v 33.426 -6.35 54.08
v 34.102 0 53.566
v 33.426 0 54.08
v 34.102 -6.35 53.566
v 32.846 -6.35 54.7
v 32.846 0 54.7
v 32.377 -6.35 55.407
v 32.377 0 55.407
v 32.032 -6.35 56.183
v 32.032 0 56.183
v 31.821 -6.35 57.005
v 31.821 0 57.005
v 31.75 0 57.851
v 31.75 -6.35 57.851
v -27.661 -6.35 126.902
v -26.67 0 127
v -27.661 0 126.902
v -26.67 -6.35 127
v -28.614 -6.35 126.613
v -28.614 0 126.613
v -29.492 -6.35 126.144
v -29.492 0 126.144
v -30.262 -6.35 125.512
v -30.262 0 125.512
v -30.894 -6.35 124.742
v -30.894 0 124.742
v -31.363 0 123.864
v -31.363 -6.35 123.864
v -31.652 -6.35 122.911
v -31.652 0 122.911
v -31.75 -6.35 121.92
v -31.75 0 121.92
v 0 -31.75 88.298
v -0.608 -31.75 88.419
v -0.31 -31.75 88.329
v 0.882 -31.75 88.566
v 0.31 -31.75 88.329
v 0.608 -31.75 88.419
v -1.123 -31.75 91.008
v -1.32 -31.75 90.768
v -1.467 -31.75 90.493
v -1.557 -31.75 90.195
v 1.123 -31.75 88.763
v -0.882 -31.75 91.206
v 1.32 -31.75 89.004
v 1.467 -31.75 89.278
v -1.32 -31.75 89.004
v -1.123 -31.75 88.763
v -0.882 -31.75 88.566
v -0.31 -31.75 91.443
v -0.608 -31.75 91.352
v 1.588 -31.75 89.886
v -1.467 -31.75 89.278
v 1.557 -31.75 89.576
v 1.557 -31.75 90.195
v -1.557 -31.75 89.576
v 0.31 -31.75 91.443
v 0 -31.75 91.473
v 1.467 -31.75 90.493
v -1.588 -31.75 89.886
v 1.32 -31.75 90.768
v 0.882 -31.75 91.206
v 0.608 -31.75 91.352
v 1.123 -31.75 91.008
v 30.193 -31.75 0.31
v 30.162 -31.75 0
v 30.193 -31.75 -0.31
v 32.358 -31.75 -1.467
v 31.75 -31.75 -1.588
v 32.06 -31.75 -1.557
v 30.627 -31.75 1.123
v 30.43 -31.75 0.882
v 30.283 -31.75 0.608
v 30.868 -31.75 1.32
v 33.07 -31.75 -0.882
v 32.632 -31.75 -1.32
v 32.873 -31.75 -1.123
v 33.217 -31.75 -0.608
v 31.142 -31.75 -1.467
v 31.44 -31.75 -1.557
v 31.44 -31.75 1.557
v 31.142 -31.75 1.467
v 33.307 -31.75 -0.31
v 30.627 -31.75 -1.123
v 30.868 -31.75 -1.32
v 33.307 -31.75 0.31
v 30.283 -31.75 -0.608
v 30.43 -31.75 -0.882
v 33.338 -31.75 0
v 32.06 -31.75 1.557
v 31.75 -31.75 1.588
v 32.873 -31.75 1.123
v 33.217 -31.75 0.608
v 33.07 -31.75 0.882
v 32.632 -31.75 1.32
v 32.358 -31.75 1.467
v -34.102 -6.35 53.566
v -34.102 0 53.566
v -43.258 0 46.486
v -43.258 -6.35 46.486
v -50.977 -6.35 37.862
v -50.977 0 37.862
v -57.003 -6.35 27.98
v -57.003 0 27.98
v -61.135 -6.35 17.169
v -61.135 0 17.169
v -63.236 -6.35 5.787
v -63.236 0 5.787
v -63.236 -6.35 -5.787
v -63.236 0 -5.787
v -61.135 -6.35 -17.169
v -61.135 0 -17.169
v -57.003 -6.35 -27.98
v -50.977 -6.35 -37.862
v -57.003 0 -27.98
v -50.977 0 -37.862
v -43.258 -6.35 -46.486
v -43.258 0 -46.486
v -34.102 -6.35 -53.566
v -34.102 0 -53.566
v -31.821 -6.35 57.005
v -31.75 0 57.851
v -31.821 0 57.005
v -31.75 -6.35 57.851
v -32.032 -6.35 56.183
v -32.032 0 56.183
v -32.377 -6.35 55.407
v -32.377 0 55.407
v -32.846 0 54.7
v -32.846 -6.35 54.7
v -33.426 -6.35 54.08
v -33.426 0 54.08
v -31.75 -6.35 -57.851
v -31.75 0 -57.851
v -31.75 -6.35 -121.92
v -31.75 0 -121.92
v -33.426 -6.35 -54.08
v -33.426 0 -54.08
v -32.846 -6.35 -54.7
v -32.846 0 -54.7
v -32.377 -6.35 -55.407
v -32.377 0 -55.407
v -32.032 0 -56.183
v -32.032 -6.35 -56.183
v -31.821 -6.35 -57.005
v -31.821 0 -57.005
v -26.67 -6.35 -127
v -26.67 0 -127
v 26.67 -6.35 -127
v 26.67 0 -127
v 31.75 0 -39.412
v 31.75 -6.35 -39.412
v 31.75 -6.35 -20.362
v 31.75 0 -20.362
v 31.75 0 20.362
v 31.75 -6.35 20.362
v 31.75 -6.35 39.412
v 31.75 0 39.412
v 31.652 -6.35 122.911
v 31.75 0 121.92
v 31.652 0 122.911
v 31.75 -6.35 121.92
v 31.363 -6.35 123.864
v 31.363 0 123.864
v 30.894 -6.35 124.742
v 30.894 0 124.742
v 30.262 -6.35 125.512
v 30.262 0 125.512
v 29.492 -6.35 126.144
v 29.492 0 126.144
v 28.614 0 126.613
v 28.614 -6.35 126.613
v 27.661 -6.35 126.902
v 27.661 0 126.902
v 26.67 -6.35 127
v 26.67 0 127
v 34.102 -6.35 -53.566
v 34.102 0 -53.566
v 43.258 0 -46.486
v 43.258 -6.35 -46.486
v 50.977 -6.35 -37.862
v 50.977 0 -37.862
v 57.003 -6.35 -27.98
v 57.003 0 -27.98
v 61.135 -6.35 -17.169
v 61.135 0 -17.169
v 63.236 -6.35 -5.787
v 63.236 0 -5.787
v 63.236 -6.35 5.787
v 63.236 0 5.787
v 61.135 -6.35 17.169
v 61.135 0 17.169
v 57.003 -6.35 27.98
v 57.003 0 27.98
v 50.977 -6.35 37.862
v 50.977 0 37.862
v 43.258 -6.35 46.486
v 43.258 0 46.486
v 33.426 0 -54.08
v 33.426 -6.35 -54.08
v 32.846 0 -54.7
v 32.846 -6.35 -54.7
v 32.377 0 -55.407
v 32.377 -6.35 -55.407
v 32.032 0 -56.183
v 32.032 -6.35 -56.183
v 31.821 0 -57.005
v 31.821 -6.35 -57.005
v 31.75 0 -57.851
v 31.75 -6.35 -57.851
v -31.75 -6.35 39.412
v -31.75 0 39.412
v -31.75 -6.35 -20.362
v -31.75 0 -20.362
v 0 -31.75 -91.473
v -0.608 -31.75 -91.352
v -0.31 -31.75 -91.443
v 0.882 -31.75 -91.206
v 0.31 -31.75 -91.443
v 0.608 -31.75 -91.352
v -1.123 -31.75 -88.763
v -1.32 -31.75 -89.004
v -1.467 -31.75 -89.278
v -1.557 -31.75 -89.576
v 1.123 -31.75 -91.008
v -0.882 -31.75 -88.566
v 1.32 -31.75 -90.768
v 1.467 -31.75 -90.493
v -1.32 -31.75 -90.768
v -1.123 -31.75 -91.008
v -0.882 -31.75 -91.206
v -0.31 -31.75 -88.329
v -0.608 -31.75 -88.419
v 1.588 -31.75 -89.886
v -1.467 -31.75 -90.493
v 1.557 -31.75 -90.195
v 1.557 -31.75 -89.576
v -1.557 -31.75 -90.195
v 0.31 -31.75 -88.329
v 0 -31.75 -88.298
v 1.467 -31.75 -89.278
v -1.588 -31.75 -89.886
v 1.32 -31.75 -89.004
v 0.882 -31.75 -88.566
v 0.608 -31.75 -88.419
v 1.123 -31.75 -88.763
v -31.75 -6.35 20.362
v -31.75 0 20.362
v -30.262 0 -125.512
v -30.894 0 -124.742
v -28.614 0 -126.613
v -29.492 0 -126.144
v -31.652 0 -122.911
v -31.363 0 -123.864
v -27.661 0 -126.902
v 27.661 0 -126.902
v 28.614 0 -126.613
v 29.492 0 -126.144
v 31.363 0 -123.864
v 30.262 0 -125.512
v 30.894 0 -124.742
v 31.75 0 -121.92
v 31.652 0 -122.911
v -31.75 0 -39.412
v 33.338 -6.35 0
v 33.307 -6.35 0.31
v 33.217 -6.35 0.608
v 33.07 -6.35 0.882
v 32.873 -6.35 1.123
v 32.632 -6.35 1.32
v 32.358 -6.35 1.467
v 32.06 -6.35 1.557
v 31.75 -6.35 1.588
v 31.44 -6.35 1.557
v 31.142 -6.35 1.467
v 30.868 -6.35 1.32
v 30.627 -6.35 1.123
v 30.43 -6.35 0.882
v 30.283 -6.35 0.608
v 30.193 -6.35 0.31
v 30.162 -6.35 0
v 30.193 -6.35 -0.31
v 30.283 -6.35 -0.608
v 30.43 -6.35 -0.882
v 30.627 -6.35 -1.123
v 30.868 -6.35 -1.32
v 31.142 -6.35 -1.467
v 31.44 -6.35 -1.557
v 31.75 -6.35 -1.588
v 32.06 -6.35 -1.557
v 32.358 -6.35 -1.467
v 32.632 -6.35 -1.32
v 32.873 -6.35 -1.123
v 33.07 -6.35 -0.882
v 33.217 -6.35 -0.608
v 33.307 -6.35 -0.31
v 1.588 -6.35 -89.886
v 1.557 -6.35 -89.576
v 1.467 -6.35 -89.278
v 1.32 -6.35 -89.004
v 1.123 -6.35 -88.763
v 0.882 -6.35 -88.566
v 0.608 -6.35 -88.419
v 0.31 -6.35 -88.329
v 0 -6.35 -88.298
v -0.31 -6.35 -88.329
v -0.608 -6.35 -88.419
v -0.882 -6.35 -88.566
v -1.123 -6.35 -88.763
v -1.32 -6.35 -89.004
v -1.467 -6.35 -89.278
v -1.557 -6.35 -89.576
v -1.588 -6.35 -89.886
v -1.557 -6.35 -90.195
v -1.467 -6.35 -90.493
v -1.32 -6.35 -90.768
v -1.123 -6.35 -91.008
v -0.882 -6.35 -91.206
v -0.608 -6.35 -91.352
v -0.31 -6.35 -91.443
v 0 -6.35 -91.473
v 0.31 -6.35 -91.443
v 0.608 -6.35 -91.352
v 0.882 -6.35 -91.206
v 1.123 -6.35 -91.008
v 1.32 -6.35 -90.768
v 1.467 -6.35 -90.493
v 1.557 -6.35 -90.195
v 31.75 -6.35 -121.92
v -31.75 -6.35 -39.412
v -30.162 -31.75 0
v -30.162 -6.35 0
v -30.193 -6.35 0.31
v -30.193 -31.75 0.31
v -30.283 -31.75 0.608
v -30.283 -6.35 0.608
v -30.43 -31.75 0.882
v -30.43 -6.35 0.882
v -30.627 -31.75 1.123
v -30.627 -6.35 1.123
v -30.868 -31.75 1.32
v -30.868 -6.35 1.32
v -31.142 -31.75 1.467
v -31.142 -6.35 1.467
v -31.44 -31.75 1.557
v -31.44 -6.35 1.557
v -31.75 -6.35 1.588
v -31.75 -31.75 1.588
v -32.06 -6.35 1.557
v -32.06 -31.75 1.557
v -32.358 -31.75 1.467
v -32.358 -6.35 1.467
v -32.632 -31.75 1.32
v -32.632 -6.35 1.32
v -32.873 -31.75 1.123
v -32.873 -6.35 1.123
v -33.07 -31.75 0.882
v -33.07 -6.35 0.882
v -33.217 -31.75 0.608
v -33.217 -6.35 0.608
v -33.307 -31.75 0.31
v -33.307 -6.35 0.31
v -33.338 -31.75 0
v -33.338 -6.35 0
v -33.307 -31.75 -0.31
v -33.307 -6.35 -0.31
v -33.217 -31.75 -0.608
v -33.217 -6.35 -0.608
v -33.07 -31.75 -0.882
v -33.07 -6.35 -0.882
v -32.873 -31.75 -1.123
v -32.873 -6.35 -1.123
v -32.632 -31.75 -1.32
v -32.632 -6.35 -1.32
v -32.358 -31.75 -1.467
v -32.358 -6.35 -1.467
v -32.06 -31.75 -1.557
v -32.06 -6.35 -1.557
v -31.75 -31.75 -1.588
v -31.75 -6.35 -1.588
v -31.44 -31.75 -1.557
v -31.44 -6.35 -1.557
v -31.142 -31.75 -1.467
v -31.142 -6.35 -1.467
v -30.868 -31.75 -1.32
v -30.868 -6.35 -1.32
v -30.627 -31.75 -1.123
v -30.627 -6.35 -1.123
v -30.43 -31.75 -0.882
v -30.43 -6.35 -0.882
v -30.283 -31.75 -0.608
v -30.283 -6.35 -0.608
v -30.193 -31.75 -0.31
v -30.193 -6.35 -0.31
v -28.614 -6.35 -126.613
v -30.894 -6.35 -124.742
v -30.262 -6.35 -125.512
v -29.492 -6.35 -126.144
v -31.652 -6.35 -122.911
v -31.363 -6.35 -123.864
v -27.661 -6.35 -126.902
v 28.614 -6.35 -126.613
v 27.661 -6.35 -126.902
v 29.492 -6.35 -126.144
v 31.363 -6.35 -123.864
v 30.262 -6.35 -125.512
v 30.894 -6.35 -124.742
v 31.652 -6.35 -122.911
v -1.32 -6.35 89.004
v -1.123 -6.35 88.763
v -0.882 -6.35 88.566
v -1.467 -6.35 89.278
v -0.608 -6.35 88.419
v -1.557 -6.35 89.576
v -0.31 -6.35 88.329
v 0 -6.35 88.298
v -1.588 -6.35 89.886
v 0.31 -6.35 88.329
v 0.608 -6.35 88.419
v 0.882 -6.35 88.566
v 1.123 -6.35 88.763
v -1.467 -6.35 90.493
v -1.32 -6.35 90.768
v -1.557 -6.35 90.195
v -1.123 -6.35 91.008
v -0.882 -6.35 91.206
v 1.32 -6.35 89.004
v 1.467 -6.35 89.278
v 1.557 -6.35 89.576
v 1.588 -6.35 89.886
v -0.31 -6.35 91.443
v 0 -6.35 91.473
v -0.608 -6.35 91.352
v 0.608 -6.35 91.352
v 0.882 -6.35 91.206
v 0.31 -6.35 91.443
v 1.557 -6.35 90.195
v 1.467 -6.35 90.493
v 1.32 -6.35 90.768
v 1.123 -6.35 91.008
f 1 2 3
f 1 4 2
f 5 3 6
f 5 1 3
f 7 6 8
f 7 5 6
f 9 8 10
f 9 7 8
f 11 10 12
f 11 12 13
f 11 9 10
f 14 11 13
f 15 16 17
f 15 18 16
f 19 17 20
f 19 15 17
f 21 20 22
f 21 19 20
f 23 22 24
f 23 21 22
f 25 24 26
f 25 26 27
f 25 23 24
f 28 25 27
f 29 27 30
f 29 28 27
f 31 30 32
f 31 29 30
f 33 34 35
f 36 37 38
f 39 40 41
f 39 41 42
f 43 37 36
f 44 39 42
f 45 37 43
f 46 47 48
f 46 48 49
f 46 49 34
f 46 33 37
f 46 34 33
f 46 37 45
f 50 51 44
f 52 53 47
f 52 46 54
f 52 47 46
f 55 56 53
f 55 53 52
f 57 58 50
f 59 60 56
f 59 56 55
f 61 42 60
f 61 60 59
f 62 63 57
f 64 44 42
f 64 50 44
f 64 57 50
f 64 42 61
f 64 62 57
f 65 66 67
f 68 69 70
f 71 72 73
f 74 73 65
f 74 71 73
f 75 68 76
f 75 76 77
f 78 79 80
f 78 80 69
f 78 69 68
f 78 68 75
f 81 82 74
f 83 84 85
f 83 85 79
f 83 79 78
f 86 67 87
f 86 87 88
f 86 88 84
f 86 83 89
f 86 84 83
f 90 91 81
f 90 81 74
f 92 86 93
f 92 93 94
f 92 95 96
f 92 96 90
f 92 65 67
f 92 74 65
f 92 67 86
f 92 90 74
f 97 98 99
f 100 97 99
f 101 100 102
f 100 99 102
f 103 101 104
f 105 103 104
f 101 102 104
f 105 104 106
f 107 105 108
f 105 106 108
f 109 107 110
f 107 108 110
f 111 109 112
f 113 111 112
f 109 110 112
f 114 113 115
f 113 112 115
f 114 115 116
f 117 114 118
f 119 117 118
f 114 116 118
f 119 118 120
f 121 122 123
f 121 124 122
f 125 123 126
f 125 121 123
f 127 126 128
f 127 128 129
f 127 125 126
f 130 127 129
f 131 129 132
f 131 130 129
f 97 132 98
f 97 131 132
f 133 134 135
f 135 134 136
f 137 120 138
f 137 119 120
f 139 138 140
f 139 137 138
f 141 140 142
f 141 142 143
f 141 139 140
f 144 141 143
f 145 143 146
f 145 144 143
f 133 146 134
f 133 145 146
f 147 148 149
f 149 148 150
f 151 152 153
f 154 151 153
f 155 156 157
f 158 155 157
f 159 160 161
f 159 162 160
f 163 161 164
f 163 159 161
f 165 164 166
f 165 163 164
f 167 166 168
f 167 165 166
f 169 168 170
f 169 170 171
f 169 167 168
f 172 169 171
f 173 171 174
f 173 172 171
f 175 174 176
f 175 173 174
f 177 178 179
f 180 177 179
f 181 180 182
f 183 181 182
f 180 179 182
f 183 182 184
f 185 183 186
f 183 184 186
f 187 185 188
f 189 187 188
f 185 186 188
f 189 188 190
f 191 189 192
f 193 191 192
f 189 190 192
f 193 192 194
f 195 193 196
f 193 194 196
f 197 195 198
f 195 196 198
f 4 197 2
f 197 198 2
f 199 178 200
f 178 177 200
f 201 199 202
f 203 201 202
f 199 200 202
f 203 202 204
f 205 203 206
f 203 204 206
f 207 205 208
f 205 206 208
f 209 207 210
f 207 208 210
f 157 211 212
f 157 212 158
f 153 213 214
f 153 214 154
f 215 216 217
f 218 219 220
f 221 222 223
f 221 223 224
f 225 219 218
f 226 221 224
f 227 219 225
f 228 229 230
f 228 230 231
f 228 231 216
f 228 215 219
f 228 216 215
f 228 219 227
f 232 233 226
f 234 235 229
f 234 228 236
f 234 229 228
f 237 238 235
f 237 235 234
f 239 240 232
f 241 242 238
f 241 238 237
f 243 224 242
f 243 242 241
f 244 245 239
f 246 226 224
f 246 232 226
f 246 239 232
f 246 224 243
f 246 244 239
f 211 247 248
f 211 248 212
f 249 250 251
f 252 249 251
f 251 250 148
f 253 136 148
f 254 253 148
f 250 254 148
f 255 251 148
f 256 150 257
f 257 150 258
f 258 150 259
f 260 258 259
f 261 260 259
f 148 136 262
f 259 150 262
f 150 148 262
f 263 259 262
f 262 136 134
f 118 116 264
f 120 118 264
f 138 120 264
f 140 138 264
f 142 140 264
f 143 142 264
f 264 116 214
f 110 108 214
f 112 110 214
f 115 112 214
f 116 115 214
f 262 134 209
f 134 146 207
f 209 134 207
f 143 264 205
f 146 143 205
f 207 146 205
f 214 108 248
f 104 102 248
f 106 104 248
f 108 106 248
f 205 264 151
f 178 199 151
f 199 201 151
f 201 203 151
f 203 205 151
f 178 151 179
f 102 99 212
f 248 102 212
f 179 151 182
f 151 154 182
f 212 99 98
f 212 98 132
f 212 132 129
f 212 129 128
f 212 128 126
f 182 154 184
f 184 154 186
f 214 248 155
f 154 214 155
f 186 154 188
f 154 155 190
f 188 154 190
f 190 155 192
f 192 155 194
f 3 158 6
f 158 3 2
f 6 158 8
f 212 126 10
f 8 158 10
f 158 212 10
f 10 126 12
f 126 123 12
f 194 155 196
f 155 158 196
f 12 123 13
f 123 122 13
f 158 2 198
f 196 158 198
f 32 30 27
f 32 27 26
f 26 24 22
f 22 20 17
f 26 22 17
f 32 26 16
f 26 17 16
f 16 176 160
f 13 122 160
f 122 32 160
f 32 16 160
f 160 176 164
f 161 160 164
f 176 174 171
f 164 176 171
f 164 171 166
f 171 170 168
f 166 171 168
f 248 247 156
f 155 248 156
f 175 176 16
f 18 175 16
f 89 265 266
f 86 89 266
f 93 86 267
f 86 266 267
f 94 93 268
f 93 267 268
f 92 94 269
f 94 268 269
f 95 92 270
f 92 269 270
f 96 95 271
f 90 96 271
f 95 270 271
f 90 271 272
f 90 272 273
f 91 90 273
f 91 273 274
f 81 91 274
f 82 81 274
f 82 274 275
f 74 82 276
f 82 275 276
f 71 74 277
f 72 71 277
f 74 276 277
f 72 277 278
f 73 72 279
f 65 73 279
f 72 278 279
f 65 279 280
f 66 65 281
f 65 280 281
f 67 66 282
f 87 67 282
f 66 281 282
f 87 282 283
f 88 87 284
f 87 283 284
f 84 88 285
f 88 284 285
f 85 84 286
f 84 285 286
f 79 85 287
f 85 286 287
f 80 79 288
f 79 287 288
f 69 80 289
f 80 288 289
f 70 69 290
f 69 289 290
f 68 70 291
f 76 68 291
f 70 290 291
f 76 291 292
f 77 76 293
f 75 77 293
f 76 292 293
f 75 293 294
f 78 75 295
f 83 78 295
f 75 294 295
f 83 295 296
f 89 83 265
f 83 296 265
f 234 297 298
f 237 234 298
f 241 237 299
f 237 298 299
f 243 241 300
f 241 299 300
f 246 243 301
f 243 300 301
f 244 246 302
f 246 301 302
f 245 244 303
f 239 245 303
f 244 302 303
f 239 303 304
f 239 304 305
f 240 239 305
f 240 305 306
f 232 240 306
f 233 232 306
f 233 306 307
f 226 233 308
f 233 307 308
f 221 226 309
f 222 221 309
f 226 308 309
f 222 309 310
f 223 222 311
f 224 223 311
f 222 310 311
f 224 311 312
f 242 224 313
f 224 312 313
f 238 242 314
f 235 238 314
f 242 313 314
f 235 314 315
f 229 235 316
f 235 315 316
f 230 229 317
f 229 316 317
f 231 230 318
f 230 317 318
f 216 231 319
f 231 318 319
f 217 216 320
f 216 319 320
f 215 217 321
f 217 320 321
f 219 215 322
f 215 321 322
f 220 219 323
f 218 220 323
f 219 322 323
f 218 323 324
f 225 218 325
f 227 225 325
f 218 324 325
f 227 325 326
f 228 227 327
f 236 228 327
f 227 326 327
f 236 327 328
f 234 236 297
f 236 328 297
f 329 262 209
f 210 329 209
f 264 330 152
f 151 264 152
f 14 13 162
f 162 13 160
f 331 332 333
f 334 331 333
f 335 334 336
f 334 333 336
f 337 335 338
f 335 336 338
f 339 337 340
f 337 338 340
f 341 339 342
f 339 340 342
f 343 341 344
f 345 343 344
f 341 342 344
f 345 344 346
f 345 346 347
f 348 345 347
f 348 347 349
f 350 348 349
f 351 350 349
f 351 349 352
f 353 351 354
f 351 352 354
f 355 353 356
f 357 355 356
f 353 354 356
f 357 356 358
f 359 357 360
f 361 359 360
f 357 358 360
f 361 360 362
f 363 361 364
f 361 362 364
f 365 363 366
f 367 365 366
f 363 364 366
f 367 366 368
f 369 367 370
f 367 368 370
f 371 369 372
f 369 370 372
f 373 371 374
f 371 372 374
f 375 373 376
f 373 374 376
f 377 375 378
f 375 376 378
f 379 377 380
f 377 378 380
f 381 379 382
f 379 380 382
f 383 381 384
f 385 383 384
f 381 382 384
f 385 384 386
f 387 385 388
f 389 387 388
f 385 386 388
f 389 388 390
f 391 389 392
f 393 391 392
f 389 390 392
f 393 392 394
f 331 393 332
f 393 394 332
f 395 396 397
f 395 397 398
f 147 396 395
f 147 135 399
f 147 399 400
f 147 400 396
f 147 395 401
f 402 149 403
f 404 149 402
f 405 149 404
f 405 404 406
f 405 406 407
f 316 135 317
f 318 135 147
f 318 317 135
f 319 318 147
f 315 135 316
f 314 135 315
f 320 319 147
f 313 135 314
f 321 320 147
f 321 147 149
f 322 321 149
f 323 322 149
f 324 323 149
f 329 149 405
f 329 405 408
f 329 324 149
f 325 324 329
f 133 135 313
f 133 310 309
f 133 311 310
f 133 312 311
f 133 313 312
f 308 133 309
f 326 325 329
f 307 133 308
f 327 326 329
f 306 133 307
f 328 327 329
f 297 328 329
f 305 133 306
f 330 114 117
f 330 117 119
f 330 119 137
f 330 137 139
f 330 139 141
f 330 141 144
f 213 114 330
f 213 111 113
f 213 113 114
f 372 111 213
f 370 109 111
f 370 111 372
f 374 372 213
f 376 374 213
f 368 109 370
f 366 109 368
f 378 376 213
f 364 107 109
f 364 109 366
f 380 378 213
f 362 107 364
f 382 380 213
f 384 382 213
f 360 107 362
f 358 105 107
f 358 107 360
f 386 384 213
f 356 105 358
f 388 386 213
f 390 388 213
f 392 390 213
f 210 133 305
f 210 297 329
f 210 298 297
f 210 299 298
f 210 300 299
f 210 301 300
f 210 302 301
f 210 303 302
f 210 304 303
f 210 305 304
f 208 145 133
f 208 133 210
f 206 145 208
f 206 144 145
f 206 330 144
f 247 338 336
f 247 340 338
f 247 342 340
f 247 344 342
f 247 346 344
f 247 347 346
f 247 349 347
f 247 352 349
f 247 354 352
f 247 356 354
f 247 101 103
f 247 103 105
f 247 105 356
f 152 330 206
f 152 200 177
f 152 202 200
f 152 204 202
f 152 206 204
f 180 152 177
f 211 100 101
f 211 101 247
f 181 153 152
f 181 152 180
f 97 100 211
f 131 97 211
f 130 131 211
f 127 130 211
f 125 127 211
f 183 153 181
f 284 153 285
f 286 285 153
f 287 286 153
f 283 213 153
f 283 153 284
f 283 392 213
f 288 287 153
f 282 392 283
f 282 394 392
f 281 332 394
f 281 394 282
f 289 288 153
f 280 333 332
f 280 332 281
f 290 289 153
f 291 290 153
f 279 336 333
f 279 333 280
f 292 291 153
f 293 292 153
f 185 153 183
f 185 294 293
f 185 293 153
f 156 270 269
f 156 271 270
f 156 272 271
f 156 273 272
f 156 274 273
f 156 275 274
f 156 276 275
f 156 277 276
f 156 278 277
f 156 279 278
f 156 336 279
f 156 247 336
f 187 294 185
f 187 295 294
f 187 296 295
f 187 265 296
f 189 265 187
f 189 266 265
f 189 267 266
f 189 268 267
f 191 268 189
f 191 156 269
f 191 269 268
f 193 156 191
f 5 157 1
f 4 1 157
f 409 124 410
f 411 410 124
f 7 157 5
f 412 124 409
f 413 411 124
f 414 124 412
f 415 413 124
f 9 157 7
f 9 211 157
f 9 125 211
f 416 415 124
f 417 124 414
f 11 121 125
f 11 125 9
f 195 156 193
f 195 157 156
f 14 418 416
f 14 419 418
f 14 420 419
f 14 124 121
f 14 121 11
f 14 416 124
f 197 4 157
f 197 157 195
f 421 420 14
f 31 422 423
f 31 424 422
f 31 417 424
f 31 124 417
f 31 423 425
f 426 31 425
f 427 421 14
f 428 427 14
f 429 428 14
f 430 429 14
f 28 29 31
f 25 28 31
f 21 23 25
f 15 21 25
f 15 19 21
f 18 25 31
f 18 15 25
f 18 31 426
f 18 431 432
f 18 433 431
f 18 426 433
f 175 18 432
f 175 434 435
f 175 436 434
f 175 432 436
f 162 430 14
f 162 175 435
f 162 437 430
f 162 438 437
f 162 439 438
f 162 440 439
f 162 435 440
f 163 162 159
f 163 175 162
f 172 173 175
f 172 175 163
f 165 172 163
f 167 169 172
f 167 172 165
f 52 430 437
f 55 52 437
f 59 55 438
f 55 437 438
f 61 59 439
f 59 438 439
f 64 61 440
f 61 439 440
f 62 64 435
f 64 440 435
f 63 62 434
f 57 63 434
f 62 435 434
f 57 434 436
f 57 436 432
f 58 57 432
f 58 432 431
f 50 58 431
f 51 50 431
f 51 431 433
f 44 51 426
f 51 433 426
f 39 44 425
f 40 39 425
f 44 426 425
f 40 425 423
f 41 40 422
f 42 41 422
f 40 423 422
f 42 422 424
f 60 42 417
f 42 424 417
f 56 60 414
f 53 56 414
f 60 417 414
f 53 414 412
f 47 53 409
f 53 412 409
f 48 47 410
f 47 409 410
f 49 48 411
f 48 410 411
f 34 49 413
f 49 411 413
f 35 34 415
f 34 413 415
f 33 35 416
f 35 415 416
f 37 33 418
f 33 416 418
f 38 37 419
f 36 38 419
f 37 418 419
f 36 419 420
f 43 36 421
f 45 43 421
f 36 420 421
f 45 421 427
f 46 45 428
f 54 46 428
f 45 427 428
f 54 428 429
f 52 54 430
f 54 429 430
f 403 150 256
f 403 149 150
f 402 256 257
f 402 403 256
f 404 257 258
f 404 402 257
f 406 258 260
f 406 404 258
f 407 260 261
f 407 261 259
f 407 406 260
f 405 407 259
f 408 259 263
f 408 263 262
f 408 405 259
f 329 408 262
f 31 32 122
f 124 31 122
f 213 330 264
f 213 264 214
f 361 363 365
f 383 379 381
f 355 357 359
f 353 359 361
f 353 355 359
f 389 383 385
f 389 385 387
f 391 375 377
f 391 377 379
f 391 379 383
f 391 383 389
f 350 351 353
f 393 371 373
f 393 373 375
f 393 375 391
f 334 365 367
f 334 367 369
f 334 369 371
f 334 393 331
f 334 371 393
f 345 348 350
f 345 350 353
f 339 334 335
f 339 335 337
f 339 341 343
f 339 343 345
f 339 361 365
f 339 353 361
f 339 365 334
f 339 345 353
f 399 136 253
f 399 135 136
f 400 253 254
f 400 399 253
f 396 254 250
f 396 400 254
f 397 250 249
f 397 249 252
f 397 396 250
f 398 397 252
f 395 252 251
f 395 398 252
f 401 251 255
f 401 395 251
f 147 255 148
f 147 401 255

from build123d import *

# Parameters (mm, degrees)
F1_DEPTH = 6.35
F2_R     = 5.08
F3_W     = 63.5
F3_H     = 19.05
F4_DEPTH = 25.4
F5_R     = 1.5875
F6_DEPTH = 25.4


with BuildPart() as f1:
    # F0 (on Front) → F1 (new body)
    with BuildSketch(Plane.XZ):
        with BuildLine():
            ThreePointArc((31.75, -54.9926131403), (54.9926131403, -31.75), (63.5, 0))
            ThreePointArc((63.5, 0), (54.9926131403, 31.75), (31.75, 54.9926131403))
            Line((31.75, 54.9926131403), (31.75, -54.9926131403))
        make_face()
        with BuildLine():
            Line((31.75, -54.9926131403), (31.75, 54.9926131403))
            ThreePointArc((31.75, 54.9926131403), (0, 63.5), (-31.75, 54.9926131403))
            Line((-31.75, 54.9926131403), (-31.75, -54.9926131403))
            ThreePointArc((-31.75, -54.9926131403), (0, -63.5), (31.75, -54.9926131403))
        make_face()
        with BuildLine():
            ThreePointArc((-31.75, 54.9926131403), (0, 63.5), (31.75, 54.9926131403))
            Line((31.75, 54.9926131403), (31.75, 127))
            Line((31.75, 127), (-31.75, 127))
            Line((-31.75, 127), (-31.75, 54.9926131403))
        make_face()
        with BuildLine():
            Line((31.75, -127), (31.75, -54.9926131403))
            ThreePointArc((31.75, -54.9926131403), (0, -63.5), (-31.75, -54.9926131403))
            Line((-31.75, -54.9926131403), (-31.75, -127))
            Line((-31.75, -127), (31.75, -127))
        make_face()
        with BuildLine():
            Line((-31.75, -54.9926131403), (-31.75, 54.9926131403))
            ThreePointArc((-31.75, 54.9926131403), (-63.5, 0), (-31.75, -54.9926131403))
        make_face()
    extrude(amount=F1_DEPTH)

    # F2
    f2_edges = [f1.edges().sort_by_distance(p)[0] for p in [
        (31.75, -3.175, 54.992613),
        (-31.75, -3.175, 54.992613),
        (-31.75, -3.175, -54.992613),
        (31.75, -3.175, -54.992613),
        (31.75, -3.175, 127),
        (-31.75, -3.175, 127),
        (31.75, -3.175, -127),
        (-31.75, -3.175, -127),
    ]]
    fillet(f2_edges, radius=F2_R)

    # F3 (on face) → F4 (cut)
    with BuildSketch(Plane.XZ.offset(6.35)):
        with Locations((0, 29.8867885709)):
            Rectangle(F3_W, F3_H)
        with Locations((0, -29.8867885709)):
            Rectangle(F3_W, F3_H)
    extrude(amount=-F4_DEPTH, mode=Mode.SUBTRACT)

    # F5 (on face) → F6 (join)
    with BuildSketch(Plane.XZ.offset(6.35)):
        with Locations((-31.75, 0)):
            Circle(F5_R)
        with Locations((31.75, 0)):
            Circle(F5_R)
        with Locations((0, -89.8856266138)):
            Circle(F5_R)
        with Locations((0, 89.8856266138)):
            Circle(F5_R)
    extrude(amount=F6_DEPTH)


solid = f1.part
